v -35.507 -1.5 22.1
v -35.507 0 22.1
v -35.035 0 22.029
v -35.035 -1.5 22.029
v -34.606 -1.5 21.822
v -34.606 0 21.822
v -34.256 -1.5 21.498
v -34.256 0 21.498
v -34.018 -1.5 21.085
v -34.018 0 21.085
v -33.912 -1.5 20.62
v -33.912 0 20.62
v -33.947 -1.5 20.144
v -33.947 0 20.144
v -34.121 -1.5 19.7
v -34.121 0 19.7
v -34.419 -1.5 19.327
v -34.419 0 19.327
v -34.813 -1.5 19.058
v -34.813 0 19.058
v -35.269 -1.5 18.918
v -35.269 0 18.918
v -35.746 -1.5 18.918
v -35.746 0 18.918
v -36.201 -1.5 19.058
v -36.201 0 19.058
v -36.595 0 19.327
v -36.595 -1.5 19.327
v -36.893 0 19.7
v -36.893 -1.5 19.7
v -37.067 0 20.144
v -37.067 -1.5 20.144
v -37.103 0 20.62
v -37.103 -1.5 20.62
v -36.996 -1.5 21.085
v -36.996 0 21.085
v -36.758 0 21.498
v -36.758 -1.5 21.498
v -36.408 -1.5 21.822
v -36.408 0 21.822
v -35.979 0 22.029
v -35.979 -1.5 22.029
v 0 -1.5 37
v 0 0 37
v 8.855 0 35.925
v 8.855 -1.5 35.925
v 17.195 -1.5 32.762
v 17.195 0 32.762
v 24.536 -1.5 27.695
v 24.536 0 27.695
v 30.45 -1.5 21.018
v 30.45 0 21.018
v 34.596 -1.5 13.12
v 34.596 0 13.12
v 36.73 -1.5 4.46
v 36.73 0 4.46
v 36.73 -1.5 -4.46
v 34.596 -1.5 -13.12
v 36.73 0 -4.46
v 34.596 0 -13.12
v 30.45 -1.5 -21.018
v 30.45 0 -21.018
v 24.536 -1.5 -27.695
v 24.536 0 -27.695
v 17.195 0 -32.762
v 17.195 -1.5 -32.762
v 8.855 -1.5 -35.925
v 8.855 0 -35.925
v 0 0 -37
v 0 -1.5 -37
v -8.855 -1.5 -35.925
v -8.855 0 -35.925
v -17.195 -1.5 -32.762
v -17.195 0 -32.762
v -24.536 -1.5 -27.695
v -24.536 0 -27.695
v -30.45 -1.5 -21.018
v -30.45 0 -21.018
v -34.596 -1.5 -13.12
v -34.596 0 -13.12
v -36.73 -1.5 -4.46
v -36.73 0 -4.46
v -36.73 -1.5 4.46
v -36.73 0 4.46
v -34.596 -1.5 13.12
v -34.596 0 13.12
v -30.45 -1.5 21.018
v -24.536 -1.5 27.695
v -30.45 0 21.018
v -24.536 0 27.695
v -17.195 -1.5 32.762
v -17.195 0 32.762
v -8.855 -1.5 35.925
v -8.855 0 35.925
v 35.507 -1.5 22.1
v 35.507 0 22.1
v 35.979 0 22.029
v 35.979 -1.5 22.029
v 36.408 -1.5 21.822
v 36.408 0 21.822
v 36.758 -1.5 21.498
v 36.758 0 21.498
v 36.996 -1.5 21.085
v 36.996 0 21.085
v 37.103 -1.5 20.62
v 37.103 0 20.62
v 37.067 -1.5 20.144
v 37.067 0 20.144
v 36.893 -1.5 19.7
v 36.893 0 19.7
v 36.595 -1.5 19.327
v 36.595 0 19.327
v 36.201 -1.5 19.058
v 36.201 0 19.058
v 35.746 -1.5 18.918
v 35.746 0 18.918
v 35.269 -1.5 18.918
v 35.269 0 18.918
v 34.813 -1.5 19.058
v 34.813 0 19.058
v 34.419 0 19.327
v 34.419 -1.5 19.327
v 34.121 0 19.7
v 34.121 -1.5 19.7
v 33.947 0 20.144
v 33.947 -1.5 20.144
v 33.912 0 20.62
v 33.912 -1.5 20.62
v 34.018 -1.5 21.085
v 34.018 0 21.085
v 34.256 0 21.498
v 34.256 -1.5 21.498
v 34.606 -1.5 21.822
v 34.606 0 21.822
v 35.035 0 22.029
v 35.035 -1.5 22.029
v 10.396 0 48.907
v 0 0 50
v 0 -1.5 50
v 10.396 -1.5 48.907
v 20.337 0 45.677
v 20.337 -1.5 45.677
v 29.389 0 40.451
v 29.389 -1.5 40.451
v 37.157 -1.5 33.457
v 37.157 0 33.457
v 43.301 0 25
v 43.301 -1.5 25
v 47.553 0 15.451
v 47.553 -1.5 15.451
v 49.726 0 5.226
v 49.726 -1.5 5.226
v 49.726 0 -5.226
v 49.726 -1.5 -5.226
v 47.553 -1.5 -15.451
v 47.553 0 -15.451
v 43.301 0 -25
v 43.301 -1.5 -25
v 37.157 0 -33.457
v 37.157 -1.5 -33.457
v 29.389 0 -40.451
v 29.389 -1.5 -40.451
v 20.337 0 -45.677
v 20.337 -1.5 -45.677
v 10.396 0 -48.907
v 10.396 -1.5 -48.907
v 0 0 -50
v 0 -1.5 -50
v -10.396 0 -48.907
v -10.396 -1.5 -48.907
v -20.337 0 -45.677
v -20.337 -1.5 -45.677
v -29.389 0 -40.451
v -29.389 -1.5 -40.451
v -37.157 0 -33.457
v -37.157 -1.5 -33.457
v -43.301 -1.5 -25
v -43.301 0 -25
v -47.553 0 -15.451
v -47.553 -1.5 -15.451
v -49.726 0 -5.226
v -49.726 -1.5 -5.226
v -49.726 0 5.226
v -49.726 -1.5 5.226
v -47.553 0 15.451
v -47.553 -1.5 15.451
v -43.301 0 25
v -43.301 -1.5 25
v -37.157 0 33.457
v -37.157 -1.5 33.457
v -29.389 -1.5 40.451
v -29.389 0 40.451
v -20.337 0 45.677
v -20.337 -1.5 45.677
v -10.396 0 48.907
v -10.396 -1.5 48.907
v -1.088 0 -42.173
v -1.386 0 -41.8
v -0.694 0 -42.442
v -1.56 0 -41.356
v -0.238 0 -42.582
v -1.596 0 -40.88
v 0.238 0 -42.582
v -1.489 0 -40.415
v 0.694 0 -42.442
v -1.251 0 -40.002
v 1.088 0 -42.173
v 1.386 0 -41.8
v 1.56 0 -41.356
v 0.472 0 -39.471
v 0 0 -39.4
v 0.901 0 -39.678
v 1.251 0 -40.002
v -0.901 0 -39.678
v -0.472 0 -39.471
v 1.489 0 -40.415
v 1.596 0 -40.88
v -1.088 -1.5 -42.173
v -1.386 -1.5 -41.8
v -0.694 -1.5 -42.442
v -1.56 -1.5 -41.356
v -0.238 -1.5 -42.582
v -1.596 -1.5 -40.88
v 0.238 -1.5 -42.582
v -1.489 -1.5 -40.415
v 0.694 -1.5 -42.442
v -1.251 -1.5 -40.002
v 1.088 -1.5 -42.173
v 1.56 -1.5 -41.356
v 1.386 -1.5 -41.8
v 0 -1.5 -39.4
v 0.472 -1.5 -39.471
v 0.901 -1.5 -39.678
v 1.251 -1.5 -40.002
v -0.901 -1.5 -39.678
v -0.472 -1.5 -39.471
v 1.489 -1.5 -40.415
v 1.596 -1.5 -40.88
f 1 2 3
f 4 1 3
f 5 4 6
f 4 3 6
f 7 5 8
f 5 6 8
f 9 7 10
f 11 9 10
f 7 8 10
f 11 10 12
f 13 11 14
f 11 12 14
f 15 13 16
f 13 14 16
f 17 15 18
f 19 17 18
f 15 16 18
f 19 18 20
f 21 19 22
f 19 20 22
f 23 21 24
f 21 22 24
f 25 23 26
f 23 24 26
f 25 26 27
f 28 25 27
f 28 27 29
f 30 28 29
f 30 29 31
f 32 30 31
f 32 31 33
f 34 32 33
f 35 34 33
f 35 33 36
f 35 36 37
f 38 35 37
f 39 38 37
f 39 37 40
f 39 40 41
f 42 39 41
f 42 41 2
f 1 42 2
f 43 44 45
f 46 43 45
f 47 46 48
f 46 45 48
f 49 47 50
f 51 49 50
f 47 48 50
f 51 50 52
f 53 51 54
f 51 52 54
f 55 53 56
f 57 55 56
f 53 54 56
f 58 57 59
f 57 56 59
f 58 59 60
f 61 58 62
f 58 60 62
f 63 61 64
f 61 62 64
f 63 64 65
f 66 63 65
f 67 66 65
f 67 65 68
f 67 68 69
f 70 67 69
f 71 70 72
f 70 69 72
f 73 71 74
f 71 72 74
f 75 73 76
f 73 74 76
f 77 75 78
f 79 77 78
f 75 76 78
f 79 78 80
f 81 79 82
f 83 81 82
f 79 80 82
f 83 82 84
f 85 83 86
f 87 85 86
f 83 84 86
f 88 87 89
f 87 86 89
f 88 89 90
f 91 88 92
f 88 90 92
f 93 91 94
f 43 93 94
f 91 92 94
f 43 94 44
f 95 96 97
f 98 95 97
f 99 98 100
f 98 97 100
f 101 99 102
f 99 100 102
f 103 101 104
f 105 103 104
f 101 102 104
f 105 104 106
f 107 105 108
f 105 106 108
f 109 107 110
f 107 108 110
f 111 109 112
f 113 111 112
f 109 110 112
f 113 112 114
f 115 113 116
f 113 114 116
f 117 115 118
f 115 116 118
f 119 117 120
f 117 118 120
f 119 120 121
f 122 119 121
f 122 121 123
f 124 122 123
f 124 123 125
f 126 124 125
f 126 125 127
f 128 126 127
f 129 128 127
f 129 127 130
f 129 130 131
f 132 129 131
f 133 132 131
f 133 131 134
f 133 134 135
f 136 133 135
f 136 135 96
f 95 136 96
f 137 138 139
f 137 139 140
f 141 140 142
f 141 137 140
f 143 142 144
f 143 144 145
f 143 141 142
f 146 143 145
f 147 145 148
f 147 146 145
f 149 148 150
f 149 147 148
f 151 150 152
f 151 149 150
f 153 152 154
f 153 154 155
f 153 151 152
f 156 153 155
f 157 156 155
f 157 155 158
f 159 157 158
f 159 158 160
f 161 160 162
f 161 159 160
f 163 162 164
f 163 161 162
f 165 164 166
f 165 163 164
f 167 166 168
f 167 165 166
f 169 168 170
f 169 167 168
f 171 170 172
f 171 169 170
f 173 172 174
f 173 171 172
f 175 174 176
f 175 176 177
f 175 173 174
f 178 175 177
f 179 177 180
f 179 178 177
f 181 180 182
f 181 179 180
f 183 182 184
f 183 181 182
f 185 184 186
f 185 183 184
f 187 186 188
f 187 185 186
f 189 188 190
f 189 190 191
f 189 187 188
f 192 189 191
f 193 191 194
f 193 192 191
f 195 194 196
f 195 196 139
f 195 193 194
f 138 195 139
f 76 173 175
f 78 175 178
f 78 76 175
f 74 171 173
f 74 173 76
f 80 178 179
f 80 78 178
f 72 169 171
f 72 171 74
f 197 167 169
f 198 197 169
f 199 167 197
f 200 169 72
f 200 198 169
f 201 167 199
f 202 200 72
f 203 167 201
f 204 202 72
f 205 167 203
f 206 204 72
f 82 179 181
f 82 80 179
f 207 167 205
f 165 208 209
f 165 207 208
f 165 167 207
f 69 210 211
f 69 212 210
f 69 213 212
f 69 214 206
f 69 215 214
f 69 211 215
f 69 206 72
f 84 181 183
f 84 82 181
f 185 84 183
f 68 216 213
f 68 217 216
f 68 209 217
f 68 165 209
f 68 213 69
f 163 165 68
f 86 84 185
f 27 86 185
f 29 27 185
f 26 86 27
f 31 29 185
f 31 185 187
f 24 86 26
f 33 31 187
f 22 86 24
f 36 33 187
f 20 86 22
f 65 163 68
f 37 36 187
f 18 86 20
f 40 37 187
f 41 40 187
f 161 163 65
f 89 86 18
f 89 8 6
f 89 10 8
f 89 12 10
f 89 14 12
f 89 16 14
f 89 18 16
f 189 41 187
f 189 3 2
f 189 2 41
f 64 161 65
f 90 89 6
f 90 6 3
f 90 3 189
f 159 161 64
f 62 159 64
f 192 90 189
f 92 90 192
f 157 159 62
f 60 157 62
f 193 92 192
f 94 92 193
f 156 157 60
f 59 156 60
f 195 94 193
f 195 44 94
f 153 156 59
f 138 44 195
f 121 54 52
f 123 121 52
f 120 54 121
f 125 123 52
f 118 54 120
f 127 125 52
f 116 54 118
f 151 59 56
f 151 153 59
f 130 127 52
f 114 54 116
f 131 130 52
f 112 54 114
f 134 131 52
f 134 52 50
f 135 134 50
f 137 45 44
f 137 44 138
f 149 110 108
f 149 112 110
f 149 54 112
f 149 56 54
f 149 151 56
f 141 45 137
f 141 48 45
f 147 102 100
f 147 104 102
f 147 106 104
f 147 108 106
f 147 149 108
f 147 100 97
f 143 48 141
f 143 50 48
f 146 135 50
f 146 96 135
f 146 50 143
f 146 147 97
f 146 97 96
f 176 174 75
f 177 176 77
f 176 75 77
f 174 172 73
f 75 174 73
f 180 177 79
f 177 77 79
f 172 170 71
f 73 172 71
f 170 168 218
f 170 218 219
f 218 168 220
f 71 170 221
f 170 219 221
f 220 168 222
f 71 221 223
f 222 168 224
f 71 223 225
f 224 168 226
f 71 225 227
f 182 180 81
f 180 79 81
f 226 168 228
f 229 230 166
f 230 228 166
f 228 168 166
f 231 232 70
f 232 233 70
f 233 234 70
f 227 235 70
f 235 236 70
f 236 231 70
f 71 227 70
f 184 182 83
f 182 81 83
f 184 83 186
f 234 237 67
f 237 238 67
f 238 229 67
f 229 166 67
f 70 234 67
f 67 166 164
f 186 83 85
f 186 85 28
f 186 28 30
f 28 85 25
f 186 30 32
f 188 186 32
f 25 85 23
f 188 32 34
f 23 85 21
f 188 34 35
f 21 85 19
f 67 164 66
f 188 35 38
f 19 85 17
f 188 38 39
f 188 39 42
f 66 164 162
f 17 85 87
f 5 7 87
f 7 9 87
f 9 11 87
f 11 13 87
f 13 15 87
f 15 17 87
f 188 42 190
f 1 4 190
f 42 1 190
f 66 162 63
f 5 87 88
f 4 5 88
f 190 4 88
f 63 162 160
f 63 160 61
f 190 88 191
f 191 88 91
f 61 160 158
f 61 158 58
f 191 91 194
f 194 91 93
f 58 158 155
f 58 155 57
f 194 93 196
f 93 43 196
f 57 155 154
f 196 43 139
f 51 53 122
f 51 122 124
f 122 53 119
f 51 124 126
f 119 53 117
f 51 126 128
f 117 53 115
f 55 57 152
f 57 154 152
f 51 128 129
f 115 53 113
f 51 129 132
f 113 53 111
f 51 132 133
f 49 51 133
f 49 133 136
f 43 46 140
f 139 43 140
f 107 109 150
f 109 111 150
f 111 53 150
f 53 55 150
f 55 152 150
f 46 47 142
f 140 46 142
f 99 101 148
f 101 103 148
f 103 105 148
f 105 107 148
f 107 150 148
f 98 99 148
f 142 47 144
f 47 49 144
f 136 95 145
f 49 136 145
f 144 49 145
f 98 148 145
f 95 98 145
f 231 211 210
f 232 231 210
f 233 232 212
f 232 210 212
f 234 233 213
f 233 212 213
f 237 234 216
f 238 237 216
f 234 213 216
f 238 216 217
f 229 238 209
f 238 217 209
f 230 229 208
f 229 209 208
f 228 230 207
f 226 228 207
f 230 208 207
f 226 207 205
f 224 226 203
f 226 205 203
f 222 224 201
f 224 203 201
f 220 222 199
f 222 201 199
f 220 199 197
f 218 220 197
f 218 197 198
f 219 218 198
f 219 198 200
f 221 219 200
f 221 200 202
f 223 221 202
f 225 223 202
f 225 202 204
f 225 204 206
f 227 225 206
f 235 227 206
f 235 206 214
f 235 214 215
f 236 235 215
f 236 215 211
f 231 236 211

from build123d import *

# Parameters (mm, degrees)
SKETCH1_R          = 50
SKETCH1_R_2        = 37
BASE_FLANGE1_DEPTH = 1.5
SKETCH6_R          = 1.6
CUT_EXTRUDE1_DEPTH = 71.726586232


# Sheet-metal steps are written as plain solids
with BuildPart() as part:
    # Sketch1 → Base-Flange1 (new body)
    with BuildSketch(Plane(origin=(0, 0, 0), x_dir=(1, 0, 0), z_dir=(0, 1, 0))):
        with Locations(Location((0, 0, 0), (0, 0, 270))):
            Circle(SKETCH1_R)
        with Locations(Location((0, 0, 0), (0, 0, 270))):
            Circle(SKETCH1_R_2, mode=Mode.SUBTRACT)
    extrude(amount=-BASE_FLANGE1_DEPTH)

    # Sketch6 → Cut-Extrude1 (cut, through all)
    with BuildSketch(Plane(origin=(0, 0, 0), x_dir=(1, 0, 0), z_dir=(0, 1, 0))):
        with Locations(Location((0, 41, 0), (0, 0, 270))):
            Circle(SKETCH6_R)
        with Locations(Location((35.507041555, -20.5, 0), (0, 0, 270))):
            Circle(SKETCH6_R)
        with Locations(Location((-35.507041555, -20.5, 0), (0, 0, 270))):
            Circle(SKETCH6_R)
    extrude(amount=-CUT_EXTRUDE1_DEPTH, mode=Mode.SUBTRACT)


solid = part.part
